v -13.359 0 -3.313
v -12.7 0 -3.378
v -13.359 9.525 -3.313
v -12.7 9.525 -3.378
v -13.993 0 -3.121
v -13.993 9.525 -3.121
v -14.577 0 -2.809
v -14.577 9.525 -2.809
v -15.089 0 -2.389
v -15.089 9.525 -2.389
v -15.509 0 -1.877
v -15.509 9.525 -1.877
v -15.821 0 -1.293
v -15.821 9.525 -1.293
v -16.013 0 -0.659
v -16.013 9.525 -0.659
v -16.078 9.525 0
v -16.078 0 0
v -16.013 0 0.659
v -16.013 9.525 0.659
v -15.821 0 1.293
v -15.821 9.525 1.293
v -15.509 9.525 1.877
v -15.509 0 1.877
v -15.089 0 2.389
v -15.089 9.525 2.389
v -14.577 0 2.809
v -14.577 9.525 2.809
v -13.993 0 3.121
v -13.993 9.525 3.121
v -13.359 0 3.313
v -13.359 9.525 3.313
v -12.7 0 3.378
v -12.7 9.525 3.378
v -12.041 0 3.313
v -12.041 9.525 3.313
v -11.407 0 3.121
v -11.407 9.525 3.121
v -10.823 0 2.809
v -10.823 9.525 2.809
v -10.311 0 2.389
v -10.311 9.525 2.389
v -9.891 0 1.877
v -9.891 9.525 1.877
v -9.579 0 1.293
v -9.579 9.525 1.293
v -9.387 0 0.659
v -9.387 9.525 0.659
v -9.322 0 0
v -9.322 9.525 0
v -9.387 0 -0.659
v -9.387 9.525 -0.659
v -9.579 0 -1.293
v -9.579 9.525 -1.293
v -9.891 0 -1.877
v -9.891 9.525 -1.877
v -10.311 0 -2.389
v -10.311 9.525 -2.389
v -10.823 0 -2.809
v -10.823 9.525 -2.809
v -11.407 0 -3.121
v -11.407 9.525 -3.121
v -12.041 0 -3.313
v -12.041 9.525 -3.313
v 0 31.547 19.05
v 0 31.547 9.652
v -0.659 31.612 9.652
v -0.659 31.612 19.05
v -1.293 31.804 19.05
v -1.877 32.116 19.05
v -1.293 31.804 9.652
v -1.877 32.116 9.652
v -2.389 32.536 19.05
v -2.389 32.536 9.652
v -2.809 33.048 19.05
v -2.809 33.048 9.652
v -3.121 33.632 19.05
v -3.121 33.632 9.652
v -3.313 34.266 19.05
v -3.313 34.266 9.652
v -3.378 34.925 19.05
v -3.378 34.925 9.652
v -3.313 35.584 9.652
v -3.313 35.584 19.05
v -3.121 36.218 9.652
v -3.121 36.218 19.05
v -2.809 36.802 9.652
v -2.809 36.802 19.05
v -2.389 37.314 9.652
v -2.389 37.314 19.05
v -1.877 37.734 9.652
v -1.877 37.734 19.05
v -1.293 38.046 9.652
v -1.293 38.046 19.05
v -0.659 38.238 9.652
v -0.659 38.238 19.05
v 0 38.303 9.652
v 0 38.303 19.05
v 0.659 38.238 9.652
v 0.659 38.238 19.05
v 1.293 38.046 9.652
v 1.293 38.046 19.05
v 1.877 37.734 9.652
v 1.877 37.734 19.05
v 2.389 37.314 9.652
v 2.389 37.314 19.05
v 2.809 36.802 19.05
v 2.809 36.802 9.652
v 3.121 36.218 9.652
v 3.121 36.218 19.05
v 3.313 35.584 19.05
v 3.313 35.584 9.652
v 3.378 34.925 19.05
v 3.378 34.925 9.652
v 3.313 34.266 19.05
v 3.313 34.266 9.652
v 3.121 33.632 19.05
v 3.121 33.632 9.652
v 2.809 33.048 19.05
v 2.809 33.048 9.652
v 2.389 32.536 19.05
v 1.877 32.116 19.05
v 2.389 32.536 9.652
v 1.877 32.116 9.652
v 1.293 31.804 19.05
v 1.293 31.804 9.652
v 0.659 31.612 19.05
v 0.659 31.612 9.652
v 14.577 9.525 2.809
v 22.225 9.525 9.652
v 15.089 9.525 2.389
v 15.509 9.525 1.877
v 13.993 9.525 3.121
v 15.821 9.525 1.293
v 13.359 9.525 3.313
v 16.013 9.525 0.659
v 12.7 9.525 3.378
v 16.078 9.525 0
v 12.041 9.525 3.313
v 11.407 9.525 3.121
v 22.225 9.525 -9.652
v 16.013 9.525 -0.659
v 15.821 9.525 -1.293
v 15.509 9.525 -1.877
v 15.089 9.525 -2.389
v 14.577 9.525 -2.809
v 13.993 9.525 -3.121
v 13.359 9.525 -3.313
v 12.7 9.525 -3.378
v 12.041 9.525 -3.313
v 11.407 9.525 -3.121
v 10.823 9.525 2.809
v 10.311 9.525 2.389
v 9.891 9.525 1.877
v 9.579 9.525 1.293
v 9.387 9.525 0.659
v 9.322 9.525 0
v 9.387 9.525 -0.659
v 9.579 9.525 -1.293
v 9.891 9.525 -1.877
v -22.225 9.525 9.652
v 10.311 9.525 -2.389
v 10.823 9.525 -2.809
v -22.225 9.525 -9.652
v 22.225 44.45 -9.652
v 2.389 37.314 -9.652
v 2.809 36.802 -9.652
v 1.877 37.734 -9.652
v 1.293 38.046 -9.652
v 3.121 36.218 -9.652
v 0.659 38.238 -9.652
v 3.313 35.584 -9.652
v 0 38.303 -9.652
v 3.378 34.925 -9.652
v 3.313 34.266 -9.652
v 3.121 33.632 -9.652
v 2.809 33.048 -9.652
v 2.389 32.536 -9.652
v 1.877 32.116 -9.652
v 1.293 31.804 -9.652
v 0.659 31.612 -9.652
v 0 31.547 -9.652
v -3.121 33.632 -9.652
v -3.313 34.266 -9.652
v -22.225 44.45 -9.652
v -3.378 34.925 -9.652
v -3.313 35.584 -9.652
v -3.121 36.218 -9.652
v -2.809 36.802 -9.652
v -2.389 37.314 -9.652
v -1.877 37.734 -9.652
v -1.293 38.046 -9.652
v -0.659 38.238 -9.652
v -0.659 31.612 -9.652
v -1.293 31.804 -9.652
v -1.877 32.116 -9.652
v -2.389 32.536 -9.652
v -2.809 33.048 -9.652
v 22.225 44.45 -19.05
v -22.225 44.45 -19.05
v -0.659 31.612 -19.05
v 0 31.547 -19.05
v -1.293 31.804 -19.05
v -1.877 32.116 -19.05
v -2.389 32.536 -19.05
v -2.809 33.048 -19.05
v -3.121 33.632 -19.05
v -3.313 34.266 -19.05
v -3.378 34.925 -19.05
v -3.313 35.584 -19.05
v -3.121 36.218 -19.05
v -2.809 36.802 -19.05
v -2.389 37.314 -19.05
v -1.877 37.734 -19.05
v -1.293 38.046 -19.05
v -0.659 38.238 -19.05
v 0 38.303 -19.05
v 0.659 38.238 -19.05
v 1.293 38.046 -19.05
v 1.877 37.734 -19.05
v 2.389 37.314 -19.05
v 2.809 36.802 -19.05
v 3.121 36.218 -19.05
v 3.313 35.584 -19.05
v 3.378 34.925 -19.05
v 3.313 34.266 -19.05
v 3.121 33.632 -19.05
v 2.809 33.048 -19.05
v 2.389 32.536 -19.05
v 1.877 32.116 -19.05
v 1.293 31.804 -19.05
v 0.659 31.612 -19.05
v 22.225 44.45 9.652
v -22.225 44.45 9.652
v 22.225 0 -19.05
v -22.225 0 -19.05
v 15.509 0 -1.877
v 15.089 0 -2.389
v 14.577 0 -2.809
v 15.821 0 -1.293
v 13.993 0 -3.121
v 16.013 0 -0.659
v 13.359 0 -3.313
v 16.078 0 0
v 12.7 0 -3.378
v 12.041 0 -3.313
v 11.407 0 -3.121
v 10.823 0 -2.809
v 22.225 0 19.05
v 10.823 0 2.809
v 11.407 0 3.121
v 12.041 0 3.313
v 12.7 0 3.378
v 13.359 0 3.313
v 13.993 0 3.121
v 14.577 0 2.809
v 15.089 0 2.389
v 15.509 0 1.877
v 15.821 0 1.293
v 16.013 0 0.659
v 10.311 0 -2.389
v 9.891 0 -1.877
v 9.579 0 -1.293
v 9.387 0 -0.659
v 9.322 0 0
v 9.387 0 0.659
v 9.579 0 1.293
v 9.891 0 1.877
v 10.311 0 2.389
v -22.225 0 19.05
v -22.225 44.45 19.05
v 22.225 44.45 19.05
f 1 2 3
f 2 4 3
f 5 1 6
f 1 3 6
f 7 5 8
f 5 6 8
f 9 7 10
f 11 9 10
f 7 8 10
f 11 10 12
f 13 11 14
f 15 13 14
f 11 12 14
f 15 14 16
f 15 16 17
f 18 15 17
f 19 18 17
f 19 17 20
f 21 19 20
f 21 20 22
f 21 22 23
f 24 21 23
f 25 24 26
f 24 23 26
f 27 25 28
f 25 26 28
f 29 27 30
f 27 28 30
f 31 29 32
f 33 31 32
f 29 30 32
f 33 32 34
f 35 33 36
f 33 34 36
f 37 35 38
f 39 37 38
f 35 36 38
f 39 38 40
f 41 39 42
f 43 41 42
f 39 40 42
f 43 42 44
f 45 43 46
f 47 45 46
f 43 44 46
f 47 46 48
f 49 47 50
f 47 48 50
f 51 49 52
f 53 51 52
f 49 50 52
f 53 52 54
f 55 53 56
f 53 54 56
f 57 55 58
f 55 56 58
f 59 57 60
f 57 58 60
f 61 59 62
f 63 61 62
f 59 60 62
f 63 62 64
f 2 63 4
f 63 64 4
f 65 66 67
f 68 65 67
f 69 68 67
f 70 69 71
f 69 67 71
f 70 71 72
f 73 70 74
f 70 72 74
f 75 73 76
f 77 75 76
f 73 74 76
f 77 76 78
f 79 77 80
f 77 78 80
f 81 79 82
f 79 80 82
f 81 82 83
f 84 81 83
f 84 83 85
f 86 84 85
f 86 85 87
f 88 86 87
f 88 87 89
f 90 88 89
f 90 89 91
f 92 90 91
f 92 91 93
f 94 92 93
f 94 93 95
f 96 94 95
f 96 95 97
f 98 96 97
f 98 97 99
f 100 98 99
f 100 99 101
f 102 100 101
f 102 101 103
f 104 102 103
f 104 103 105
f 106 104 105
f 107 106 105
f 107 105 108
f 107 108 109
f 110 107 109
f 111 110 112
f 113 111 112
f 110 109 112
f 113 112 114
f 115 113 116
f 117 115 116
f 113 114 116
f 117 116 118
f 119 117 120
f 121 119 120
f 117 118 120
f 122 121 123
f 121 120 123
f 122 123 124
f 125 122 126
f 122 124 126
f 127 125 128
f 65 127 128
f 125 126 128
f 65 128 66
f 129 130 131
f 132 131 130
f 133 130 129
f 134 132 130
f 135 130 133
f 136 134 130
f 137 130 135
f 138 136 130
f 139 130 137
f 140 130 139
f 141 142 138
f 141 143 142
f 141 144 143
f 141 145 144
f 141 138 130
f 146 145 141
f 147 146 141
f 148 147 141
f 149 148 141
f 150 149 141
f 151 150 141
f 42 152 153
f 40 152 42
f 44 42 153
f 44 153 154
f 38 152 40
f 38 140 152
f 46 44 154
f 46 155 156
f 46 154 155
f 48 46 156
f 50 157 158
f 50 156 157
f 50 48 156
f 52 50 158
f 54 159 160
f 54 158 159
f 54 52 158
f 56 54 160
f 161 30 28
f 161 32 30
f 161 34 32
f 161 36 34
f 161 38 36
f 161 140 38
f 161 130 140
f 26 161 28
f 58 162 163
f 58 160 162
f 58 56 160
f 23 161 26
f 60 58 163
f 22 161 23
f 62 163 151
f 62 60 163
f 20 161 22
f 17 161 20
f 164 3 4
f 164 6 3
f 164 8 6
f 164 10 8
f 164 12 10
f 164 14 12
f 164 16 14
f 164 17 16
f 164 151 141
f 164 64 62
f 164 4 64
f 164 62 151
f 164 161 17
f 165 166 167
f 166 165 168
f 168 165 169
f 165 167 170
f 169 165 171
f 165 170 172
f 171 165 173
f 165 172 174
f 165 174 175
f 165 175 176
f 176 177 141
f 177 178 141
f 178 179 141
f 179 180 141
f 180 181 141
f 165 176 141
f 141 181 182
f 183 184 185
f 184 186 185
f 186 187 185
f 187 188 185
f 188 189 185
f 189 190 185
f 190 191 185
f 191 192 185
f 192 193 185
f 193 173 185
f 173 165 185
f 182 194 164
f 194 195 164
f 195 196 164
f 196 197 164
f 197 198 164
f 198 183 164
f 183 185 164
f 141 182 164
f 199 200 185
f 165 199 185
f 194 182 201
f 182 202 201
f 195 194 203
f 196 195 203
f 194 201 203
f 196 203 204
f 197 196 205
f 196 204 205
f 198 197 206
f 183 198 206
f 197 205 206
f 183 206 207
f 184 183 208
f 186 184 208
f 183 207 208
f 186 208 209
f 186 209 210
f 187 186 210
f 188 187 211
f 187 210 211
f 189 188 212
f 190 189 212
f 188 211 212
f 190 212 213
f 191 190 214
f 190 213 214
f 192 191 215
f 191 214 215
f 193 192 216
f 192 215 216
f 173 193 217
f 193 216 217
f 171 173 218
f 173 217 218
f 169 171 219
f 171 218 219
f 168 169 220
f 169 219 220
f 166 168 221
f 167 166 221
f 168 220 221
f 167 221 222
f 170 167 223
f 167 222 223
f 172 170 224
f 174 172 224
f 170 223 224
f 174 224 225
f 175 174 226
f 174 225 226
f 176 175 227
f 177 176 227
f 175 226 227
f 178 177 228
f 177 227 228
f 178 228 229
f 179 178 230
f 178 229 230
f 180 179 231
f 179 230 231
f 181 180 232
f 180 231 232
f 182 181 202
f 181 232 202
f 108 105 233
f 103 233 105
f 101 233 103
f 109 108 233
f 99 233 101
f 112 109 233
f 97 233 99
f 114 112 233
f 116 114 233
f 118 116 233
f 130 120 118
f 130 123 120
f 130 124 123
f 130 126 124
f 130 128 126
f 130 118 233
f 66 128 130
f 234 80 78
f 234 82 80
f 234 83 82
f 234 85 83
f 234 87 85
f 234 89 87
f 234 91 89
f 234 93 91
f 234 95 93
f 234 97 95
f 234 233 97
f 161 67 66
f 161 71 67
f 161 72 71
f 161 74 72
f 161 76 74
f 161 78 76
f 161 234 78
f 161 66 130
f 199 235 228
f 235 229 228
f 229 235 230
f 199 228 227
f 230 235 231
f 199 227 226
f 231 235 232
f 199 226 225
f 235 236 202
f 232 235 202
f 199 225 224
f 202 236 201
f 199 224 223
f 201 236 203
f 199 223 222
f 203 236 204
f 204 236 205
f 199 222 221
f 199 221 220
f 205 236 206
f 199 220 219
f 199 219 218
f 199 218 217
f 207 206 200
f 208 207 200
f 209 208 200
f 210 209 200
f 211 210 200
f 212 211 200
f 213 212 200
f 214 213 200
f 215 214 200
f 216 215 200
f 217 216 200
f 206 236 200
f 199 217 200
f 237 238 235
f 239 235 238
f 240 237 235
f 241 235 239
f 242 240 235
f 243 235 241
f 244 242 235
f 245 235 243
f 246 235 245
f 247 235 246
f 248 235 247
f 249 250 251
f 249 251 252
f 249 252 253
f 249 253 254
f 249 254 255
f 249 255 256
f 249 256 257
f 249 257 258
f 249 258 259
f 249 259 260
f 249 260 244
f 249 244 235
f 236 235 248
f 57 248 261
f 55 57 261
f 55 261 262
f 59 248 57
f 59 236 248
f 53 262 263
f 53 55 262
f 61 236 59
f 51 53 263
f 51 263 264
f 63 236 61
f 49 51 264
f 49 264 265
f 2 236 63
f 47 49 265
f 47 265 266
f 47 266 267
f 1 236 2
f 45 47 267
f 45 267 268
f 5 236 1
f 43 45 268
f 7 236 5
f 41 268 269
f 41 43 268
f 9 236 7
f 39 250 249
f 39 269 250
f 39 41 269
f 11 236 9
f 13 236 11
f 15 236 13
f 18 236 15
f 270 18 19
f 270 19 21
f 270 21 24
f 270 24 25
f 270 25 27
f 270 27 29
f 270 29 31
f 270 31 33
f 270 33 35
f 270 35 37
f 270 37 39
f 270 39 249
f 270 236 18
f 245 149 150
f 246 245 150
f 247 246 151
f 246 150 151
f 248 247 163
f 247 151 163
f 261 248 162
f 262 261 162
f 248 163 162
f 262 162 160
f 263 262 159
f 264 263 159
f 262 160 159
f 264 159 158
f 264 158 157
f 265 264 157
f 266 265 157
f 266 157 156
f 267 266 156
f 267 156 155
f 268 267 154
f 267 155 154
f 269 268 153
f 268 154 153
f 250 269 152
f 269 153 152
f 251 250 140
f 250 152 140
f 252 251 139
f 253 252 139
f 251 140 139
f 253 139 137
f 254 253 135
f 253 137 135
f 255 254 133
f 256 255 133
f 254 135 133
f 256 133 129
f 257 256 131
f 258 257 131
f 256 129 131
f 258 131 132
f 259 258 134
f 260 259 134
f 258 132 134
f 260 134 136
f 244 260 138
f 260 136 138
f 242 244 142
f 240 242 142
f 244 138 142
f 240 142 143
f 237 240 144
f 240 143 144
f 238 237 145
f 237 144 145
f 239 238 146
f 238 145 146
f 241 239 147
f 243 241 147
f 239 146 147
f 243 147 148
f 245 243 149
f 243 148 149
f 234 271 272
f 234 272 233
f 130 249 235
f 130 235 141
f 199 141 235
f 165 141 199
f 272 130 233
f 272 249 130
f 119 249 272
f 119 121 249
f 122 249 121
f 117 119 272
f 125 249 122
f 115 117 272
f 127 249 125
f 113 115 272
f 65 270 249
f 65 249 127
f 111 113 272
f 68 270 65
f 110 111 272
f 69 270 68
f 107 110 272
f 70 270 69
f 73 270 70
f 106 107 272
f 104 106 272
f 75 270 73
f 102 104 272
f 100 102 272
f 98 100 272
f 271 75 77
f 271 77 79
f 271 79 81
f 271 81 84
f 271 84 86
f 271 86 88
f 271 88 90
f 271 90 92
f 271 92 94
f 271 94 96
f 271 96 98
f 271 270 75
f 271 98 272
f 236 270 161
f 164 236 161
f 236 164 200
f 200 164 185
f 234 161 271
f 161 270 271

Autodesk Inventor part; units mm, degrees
ref_plane "YZ Plane" through (0, 0, 0) normal (1, 0, 0) x (0, 1, 0)
ref_plane "XZ Plane" through (0, 0, 0) normal (0, 1, 0) x (-1, 0, 0)
ref_plane "XY Plane" through (0, 0, 0) normal (0, 0, 1) x (1, 0, 0)
sketch "Sketch2" plane through (0, 0, 0) normal (1, 0, 0) x (0, 1, 0)
  line L0 (0, 0) -> (0, -19.05)
  line L1 (0, -19.05) -> (44.45, -19.05)
  line L2 (44.45, -19.05) -> (44.45, -9.652)
  line L3 (44.45, -9.652) -> (9.525, -9.652)
  line L4 (9.525, -9.652) -> (9.525, 0)
  line L5 (9.525, 0) -> (0, 0) construction
  line L6 (0, 0) -> (0, 19.05)
  line L7 (0, 19.05) -> (44.45, 19.05)
  line L8 (44.45, 19.05) -> (44.45, 9.652)
  line L9 (44.45, 9.652) -> (9.525, 9.652)
  line L10 (9.525, 9.652) -> (9.525, 0)
  dimension "d5" = 44.45
  dimension "d7" = 9.398
  dimension "d8" = 9.525
  dimension "d42" = 9.652
extrude "Extrusion2" add sketch "Sketch2" along normal mid plane 44.45
sketch "Sketch3" plane through (-22.225, 0, 19.05) normal (0, 0, 1) x (1, 0, 0)
  line L0 (0, 44.45) -> (44.45, 44.45) projected
  line L1 (22.225, 44.45) -> (22.225, 0) construction
  point P0 (22.225, 34.925)
  dimension "d19" = 9.525
hole "Hole2" at (0, 34.925, 19.05) direction (0, 0, -1) diameter 6.7564 end through all clearance for "Flat Head Machine Screw (82)" size "1/4" standard "Ansi Unified Screw Threads"
sketch "Sketch4" plane through (-22.225, 0, -19.05) normal (0, -1, 0) x (1, 0, 0)
  line L0 (44.45, 9.398) -> (44.45, 28.702) construction
  line L1 (44.45, 19.05) -> (0, 19.05) construction
  line L2 (0, 28.702) -> (0, 9.398) construction
  line L3 (44.45, 38.1) -> (44.45, 0) construction
  line L4 (19.05, 19.05) -> (-25.4, 19.05) construction
  point P0 (22.225, 19.05)
  point P1 (34.925, 19.05)
  point P2 (9.525, 19.05)
  dimension "d27" = 9.525
  dimension "d30" = 25.4
hole "Hole3" at (12.7, 0, 0) at (-12.7, 0, 0) direction (0, 1, 0) diameter 6.7564 end through all clearance for "Flat Head Machine Screw (82)" size "1/4" standard "Ansi Unified Screw Threads"
properties part number "BracketForEndOfArm"
